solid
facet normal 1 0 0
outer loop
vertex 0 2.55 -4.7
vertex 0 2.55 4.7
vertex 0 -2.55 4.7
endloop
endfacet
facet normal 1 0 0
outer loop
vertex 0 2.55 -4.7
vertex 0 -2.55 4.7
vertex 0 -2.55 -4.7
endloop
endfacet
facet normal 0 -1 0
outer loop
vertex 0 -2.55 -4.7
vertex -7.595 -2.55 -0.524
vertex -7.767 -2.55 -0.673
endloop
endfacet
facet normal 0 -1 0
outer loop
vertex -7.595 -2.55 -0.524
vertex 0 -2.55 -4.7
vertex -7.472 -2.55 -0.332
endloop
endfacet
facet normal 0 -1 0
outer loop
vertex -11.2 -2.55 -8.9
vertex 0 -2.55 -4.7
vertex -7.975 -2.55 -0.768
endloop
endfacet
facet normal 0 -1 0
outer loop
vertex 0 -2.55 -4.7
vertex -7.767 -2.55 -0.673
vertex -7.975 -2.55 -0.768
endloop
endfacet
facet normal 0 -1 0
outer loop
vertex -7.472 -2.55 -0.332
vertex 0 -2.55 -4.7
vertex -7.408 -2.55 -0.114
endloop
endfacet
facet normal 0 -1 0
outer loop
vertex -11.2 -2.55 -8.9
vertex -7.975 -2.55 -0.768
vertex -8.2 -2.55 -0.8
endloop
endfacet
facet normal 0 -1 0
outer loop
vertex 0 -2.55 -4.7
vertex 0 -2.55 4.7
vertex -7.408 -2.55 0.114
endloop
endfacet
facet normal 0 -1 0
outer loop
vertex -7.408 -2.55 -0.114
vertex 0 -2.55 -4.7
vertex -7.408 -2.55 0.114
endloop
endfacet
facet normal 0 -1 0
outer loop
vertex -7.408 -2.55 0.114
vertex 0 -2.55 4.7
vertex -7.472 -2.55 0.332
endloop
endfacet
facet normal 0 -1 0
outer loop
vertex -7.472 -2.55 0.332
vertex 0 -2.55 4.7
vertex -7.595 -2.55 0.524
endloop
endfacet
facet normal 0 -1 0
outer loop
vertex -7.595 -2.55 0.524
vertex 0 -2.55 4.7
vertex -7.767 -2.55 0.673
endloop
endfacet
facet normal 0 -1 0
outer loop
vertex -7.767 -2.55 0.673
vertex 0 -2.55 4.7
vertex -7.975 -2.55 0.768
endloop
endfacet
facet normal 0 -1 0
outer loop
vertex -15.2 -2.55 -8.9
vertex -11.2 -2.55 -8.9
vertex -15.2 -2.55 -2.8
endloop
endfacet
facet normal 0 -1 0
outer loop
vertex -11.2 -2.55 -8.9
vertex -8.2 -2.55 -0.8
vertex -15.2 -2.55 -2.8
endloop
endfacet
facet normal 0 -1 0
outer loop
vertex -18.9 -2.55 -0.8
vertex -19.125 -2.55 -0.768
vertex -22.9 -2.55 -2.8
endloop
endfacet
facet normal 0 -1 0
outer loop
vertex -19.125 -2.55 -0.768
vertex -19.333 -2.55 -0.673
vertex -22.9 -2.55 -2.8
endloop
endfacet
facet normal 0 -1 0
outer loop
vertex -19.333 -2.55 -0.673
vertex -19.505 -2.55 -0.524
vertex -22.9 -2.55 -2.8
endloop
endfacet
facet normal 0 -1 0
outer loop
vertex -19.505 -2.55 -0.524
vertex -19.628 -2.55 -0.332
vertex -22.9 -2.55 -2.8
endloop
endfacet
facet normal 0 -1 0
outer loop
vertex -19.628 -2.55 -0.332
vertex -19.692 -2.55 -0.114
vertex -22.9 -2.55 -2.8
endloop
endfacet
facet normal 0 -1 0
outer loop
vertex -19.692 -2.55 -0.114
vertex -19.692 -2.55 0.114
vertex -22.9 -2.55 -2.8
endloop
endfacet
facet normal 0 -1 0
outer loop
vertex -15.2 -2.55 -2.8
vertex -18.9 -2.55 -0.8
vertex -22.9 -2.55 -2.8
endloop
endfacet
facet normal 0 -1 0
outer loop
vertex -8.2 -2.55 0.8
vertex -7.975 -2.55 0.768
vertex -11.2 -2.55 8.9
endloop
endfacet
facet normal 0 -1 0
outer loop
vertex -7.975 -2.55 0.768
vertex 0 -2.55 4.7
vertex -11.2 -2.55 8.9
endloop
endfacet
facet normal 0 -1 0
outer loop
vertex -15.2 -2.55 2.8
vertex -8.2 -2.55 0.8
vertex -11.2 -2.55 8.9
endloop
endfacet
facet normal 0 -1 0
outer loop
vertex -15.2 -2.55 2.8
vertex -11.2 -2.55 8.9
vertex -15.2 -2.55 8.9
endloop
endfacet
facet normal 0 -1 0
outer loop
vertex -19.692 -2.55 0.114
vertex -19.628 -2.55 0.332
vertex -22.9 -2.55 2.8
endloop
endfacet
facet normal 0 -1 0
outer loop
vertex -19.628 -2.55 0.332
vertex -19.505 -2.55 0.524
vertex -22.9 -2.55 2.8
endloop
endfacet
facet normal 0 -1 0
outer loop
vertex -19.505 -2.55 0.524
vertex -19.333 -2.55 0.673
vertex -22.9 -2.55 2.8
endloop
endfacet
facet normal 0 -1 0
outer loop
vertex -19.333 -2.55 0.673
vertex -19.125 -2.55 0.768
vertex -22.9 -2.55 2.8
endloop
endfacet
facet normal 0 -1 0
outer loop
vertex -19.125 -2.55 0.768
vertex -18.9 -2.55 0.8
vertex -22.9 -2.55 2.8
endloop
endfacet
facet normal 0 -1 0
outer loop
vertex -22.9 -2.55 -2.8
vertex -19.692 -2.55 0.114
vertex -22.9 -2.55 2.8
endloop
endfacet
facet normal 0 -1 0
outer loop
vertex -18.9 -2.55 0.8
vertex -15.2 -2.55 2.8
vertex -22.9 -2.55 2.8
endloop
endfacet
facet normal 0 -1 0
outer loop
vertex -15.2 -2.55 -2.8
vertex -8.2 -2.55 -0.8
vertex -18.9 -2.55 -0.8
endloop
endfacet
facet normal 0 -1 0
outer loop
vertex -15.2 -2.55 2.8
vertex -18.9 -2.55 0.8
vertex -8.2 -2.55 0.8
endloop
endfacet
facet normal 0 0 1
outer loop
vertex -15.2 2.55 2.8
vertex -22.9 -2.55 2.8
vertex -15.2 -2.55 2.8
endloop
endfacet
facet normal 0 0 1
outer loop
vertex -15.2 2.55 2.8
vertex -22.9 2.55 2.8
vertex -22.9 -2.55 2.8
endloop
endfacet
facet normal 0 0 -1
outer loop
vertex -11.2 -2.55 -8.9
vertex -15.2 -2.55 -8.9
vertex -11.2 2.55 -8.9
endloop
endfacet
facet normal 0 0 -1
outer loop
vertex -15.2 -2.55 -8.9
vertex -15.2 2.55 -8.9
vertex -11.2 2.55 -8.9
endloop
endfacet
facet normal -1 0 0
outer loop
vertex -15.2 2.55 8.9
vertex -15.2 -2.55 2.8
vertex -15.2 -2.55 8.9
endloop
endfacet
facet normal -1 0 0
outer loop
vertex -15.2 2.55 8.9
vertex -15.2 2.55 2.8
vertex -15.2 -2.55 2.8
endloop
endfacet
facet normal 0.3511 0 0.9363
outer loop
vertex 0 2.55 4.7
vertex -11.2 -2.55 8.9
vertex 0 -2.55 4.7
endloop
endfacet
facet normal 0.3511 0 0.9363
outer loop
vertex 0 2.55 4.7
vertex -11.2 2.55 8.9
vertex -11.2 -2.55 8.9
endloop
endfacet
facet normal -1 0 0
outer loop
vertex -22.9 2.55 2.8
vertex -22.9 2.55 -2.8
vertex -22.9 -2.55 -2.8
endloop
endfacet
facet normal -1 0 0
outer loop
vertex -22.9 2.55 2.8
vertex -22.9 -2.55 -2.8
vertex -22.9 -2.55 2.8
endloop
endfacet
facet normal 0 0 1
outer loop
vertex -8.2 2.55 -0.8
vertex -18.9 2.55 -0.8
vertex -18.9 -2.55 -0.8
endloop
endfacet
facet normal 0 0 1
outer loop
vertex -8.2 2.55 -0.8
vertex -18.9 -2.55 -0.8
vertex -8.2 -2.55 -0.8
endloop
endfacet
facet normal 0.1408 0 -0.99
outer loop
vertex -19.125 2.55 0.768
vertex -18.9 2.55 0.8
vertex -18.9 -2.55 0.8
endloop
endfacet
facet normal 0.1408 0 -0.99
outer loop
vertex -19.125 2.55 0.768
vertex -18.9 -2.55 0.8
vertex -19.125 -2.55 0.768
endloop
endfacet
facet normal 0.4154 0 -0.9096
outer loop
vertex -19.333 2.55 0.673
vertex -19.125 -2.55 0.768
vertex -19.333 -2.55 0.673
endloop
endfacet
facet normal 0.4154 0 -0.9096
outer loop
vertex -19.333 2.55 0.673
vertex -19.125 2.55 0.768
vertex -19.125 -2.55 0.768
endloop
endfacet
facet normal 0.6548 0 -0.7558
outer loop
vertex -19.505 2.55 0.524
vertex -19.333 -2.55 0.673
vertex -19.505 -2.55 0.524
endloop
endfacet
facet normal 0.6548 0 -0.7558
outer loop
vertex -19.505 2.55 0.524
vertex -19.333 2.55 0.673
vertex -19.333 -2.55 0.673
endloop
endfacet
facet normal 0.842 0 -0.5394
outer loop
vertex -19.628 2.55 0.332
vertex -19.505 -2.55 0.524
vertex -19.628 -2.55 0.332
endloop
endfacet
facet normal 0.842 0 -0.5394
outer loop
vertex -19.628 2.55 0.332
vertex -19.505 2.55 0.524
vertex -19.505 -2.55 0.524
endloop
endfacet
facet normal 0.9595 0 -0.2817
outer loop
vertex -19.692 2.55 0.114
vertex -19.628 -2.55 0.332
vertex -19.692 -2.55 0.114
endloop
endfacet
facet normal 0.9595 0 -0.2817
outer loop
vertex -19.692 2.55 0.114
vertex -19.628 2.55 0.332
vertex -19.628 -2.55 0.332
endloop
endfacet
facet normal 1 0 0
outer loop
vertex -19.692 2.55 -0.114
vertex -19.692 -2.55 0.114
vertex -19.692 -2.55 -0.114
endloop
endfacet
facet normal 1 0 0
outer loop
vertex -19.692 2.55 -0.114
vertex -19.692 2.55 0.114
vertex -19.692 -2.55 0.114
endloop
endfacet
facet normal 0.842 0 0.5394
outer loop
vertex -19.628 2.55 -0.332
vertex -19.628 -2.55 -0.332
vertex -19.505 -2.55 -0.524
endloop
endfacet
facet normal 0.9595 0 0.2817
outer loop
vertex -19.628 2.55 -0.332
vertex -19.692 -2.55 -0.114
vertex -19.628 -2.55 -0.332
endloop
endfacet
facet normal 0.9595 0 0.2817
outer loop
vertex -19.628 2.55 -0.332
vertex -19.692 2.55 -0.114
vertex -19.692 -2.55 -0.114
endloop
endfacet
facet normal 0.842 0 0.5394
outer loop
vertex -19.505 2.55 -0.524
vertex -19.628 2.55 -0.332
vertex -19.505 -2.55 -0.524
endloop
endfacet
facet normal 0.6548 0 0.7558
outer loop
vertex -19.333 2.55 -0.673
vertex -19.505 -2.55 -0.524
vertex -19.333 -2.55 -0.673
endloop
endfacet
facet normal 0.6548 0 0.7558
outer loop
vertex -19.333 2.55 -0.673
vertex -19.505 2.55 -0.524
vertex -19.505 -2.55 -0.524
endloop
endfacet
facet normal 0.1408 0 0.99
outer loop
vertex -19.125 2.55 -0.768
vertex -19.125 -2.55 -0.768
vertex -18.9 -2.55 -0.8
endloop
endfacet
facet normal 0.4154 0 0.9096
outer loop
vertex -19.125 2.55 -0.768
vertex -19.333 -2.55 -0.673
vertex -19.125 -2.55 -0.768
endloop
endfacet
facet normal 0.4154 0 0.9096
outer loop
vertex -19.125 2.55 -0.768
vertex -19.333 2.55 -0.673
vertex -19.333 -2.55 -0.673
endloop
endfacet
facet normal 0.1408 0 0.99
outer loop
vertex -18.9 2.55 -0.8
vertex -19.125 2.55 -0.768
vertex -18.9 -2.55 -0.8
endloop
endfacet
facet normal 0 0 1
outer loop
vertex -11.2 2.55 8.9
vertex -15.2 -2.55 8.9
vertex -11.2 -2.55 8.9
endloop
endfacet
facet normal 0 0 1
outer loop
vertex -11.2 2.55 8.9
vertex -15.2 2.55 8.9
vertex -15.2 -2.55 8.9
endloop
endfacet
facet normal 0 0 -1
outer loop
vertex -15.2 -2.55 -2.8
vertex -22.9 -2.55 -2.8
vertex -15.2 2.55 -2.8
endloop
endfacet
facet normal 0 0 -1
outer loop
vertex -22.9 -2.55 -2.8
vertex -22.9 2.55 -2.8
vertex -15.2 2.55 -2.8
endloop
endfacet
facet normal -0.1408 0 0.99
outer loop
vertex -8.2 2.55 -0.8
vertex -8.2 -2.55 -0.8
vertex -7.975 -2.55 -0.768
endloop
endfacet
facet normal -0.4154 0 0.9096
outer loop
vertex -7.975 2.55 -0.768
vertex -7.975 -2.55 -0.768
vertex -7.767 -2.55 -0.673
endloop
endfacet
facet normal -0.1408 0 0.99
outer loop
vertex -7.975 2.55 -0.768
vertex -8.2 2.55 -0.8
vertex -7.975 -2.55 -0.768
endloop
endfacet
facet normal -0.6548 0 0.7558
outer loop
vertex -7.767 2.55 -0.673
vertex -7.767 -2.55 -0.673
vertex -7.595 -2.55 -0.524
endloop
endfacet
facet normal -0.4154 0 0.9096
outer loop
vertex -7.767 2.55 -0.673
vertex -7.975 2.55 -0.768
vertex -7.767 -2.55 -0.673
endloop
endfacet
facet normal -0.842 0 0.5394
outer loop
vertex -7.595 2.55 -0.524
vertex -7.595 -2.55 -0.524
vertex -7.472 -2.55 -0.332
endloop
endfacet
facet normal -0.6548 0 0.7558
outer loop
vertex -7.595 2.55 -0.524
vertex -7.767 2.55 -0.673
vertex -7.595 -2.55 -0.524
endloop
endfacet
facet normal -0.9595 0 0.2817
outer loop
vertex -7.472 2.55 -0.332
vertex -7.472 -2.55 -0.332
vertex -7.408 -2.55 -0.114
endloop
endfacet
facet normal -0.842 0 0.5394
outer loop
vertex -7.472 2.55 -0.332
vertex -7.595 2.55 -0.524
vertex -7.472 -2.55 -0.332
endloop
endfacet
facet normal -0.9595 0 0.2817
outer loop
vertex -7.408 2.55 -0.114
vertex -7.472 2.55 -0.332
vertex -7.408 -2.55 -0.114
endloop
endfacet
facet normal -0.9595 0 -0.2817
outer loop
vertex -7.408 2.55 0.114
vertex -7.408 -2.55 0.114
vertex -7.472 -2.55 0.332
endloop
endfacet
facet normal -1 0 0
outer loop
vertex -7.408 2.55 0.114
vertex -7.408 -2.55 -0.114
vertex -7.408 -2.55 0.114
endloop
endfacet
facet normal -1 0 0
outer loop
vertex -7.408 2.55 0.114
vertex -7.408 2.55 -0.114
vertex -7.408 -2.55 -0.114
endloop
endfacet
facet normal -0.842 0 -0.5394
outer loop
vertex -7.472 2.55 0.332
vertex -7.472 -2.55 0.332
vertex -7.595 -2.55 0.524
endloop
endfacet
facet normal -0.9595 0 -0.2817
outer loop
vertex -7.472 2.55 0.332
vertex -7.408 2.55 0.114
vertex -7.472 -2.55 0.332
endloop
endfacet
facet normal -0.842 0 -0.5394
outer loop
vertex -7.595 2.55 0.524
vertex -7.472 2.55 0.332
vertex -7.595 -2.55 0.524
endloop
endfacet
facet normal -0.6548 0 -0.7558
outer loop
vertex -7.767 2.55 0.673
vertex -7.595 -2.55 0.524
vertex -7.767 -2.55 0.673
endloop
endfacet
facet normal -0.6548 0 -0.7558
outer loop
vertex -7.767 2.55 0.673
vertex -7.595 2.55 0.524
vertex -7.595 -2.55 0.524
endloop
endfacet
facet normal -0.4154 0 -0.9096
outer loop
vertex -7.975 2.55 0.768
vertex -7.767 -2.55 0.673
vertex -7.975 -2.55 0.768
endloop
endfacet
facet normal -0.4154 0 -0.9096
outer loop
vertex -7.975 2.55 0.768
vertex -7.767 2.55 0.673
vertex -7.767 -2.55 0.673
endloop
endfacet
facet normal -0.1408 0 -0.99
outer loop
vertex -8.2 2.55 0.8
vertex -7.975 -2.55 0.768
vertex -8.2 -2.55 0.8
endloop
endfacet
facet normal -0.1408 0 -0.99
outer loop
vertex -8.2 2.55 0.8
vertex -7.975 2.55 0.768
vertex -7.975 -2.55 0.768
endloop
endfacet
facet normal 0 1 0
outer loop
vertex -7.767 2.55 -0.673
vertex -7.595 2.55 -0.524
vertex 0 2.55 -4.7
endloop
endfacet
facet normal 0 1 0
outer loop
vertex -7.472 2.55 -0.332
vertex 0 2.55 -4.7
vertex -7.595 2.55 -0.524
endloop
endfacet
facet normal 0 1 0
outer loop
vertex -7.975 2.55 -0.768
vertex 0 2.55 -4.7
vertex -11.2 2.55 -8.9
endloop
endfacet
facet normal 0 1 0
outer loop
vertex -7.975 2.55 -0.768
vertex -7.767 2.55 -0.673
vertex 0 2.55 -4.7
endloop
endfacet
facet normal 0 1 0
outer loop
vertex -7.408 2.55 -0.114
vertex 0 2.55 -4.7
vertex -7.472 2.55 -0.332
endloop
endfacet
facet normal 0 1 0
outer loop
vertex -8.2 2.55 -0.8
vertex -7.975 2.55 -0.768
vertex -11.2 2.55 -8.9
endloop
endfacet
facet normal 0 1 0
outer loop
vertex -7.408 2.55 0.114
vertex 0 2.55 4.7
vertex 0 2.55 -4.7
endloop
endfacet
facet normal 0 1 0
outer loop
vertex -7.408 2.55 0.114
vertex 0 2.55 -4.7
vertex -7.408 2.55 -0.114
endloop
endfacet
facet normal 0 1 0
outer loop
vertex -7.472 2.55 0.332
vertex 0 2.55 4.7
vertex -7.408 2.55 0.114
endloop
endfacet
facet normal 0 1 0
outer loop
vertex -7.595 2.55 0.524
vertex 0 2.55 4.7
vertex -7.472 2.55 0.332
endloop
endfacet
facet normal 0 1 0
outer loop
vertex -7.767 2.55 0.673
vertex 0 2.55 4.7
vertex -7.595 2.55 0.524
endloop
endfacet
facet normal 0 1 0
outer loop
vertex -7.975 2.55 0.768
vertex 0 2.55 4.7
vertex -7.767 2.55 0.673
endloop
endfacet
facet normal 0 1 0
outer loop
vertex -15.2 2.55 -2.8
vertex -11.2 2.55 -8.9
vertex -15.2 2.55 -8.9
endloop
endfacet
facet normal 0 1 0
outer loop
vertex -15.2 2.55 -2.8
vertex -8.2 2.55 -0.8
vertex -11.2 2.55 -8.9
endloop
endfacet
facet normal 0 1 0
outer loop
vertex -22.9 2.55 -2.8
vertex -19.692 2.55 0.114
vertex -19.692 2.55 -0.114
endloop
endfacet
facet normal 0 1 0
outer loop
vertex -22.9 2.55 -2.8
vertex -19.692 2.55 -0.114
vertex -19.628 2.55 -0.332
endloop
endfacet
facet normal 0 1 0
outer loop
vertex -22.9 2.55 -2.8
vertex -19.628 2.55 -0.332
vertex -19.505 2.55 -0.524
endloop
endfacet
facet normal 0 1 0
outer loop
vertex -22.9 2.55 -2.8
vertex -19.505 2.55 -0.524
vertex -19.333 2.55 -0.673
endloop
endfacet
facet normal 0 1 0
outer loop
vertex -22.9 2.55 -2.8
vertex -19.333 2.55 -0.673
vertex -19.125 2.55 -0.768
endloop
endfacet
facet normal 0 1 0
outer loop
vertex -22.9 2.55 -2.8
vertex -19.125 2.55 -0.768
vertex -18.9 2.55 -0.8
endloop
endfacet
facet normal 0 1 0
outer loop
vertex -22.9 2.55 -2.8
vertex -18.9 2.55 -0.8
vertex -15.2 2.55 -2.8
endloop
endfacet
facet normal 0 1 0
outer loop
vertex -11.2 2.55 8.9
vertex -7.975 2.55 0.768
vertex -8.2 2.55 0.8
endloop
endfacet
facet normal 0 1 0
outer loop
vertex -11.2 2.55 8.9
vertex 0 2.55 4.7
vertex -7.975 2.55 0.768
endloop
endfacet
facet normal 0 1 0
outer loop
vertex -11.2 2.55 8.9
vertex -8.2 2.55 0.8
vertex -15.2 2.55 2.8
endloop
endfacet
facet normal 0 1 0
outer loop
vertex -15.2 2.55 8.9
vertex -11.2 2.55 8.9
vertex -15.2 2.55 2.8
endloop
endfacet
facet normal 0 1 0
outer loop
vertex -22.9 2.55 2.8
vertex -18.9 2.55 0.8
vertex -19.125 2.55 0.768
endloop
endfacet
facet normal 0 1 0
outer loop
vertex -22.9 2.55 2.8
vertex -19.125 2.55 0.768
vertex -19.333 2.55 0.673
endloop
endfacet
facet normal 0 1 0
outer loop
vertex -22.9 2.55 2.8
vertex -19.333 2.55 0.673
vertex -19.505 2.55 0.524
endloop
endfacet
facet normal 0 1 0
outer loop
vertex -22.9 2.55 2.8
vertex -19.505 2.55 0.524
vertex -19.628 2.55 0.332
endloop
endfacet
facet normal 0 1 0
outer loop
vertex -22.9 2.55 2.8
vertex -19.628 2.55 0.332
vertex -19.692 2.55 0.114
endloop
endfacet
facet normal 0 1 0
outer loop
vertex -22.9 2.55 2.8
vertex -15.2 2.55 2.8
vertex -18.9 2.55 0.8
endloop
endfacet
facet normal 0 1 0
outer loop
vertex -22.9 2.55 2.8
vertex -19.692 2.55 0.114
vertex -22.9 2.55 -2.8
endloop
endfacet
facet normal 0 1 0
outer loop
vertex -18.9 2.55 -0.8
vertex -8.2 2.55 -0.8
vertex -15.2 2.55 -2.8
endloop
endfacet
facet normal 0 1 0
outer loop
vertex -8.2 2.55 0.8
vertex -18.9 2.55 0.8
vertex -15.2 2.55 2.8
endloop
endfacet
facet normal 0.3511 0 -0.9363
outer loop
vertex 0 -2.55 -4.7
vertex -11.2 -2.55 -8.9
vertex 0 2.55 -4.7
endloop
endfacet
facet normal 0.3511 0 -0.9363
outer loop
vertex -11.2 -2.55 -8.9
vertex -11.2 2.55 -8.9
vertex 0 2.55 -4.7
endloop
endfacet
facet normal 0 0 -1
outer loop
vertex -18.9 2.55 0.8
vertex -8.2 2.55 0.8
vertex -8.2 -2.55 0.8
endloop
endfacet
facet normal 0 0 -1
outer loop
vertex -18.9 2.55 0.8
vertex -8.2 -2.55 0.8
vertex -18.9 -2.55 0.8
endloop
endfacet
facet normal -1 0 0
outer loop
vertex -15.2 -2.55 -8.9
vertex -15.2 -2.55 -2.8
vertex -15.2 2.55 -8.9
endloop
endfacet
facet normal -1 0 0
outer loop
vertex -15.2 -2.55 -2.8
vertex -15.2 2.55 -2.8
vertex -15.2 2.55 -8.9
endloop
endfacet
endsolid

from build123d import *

# Parameters (mm, degrees)
BOSS_EXTRUDE1_DEPTH = 2.55
CUT_EXTRUDE1_DEPTH  = 26.092429137


with BuildPart() as part:
    # Sketch1 → Boss-Extrude1 (new, symmetric)
    with BuildSketch(Plane(origin=(0, 0, 0), x_dir=(1, 0, 0), z_dir=(0, 1, 0))):
        Polygon((-22.9, 0), (-22.9, 2.8), (-15.2, 2.8), (-15.2, 8.9), (-11.2, 8.9), (0, 4.7), (0, 0), align=None)
    boss_extrude1 = extrude(amount=BOSS_EXTRUDE1_DEPTH, both=True)

    # Mirror1: Boss-Extrude1 across plane
    add(boss_extrude1.mirror(Plane.XY))

    # Sketch2 → Cut-Extrude1 (cut, through all)
    with BuildSketch(Plane(origin=(0, 2.55, 0), x_dir=(1, 0, 0), z_dir=(0, 1, 0))):
        with BuildLine():
            Line((-18.9, 0.8), (-8.2, 0.8))
            ThreePointArc((-8.2, 0.8), (-7.4, 0), (-8.2, -0.8))
            Line((-8.2, -0.8), (-18.9, -0.8))
            ThreePointArc((-18.9, -0.8), (-19.7, 0), (-18.9, 0.8))
        make_face()
    extrude(amount=-CUT_EXTRUDE1_DEPTH, mode=Mode.SUBTRACT)


solid = part.part
